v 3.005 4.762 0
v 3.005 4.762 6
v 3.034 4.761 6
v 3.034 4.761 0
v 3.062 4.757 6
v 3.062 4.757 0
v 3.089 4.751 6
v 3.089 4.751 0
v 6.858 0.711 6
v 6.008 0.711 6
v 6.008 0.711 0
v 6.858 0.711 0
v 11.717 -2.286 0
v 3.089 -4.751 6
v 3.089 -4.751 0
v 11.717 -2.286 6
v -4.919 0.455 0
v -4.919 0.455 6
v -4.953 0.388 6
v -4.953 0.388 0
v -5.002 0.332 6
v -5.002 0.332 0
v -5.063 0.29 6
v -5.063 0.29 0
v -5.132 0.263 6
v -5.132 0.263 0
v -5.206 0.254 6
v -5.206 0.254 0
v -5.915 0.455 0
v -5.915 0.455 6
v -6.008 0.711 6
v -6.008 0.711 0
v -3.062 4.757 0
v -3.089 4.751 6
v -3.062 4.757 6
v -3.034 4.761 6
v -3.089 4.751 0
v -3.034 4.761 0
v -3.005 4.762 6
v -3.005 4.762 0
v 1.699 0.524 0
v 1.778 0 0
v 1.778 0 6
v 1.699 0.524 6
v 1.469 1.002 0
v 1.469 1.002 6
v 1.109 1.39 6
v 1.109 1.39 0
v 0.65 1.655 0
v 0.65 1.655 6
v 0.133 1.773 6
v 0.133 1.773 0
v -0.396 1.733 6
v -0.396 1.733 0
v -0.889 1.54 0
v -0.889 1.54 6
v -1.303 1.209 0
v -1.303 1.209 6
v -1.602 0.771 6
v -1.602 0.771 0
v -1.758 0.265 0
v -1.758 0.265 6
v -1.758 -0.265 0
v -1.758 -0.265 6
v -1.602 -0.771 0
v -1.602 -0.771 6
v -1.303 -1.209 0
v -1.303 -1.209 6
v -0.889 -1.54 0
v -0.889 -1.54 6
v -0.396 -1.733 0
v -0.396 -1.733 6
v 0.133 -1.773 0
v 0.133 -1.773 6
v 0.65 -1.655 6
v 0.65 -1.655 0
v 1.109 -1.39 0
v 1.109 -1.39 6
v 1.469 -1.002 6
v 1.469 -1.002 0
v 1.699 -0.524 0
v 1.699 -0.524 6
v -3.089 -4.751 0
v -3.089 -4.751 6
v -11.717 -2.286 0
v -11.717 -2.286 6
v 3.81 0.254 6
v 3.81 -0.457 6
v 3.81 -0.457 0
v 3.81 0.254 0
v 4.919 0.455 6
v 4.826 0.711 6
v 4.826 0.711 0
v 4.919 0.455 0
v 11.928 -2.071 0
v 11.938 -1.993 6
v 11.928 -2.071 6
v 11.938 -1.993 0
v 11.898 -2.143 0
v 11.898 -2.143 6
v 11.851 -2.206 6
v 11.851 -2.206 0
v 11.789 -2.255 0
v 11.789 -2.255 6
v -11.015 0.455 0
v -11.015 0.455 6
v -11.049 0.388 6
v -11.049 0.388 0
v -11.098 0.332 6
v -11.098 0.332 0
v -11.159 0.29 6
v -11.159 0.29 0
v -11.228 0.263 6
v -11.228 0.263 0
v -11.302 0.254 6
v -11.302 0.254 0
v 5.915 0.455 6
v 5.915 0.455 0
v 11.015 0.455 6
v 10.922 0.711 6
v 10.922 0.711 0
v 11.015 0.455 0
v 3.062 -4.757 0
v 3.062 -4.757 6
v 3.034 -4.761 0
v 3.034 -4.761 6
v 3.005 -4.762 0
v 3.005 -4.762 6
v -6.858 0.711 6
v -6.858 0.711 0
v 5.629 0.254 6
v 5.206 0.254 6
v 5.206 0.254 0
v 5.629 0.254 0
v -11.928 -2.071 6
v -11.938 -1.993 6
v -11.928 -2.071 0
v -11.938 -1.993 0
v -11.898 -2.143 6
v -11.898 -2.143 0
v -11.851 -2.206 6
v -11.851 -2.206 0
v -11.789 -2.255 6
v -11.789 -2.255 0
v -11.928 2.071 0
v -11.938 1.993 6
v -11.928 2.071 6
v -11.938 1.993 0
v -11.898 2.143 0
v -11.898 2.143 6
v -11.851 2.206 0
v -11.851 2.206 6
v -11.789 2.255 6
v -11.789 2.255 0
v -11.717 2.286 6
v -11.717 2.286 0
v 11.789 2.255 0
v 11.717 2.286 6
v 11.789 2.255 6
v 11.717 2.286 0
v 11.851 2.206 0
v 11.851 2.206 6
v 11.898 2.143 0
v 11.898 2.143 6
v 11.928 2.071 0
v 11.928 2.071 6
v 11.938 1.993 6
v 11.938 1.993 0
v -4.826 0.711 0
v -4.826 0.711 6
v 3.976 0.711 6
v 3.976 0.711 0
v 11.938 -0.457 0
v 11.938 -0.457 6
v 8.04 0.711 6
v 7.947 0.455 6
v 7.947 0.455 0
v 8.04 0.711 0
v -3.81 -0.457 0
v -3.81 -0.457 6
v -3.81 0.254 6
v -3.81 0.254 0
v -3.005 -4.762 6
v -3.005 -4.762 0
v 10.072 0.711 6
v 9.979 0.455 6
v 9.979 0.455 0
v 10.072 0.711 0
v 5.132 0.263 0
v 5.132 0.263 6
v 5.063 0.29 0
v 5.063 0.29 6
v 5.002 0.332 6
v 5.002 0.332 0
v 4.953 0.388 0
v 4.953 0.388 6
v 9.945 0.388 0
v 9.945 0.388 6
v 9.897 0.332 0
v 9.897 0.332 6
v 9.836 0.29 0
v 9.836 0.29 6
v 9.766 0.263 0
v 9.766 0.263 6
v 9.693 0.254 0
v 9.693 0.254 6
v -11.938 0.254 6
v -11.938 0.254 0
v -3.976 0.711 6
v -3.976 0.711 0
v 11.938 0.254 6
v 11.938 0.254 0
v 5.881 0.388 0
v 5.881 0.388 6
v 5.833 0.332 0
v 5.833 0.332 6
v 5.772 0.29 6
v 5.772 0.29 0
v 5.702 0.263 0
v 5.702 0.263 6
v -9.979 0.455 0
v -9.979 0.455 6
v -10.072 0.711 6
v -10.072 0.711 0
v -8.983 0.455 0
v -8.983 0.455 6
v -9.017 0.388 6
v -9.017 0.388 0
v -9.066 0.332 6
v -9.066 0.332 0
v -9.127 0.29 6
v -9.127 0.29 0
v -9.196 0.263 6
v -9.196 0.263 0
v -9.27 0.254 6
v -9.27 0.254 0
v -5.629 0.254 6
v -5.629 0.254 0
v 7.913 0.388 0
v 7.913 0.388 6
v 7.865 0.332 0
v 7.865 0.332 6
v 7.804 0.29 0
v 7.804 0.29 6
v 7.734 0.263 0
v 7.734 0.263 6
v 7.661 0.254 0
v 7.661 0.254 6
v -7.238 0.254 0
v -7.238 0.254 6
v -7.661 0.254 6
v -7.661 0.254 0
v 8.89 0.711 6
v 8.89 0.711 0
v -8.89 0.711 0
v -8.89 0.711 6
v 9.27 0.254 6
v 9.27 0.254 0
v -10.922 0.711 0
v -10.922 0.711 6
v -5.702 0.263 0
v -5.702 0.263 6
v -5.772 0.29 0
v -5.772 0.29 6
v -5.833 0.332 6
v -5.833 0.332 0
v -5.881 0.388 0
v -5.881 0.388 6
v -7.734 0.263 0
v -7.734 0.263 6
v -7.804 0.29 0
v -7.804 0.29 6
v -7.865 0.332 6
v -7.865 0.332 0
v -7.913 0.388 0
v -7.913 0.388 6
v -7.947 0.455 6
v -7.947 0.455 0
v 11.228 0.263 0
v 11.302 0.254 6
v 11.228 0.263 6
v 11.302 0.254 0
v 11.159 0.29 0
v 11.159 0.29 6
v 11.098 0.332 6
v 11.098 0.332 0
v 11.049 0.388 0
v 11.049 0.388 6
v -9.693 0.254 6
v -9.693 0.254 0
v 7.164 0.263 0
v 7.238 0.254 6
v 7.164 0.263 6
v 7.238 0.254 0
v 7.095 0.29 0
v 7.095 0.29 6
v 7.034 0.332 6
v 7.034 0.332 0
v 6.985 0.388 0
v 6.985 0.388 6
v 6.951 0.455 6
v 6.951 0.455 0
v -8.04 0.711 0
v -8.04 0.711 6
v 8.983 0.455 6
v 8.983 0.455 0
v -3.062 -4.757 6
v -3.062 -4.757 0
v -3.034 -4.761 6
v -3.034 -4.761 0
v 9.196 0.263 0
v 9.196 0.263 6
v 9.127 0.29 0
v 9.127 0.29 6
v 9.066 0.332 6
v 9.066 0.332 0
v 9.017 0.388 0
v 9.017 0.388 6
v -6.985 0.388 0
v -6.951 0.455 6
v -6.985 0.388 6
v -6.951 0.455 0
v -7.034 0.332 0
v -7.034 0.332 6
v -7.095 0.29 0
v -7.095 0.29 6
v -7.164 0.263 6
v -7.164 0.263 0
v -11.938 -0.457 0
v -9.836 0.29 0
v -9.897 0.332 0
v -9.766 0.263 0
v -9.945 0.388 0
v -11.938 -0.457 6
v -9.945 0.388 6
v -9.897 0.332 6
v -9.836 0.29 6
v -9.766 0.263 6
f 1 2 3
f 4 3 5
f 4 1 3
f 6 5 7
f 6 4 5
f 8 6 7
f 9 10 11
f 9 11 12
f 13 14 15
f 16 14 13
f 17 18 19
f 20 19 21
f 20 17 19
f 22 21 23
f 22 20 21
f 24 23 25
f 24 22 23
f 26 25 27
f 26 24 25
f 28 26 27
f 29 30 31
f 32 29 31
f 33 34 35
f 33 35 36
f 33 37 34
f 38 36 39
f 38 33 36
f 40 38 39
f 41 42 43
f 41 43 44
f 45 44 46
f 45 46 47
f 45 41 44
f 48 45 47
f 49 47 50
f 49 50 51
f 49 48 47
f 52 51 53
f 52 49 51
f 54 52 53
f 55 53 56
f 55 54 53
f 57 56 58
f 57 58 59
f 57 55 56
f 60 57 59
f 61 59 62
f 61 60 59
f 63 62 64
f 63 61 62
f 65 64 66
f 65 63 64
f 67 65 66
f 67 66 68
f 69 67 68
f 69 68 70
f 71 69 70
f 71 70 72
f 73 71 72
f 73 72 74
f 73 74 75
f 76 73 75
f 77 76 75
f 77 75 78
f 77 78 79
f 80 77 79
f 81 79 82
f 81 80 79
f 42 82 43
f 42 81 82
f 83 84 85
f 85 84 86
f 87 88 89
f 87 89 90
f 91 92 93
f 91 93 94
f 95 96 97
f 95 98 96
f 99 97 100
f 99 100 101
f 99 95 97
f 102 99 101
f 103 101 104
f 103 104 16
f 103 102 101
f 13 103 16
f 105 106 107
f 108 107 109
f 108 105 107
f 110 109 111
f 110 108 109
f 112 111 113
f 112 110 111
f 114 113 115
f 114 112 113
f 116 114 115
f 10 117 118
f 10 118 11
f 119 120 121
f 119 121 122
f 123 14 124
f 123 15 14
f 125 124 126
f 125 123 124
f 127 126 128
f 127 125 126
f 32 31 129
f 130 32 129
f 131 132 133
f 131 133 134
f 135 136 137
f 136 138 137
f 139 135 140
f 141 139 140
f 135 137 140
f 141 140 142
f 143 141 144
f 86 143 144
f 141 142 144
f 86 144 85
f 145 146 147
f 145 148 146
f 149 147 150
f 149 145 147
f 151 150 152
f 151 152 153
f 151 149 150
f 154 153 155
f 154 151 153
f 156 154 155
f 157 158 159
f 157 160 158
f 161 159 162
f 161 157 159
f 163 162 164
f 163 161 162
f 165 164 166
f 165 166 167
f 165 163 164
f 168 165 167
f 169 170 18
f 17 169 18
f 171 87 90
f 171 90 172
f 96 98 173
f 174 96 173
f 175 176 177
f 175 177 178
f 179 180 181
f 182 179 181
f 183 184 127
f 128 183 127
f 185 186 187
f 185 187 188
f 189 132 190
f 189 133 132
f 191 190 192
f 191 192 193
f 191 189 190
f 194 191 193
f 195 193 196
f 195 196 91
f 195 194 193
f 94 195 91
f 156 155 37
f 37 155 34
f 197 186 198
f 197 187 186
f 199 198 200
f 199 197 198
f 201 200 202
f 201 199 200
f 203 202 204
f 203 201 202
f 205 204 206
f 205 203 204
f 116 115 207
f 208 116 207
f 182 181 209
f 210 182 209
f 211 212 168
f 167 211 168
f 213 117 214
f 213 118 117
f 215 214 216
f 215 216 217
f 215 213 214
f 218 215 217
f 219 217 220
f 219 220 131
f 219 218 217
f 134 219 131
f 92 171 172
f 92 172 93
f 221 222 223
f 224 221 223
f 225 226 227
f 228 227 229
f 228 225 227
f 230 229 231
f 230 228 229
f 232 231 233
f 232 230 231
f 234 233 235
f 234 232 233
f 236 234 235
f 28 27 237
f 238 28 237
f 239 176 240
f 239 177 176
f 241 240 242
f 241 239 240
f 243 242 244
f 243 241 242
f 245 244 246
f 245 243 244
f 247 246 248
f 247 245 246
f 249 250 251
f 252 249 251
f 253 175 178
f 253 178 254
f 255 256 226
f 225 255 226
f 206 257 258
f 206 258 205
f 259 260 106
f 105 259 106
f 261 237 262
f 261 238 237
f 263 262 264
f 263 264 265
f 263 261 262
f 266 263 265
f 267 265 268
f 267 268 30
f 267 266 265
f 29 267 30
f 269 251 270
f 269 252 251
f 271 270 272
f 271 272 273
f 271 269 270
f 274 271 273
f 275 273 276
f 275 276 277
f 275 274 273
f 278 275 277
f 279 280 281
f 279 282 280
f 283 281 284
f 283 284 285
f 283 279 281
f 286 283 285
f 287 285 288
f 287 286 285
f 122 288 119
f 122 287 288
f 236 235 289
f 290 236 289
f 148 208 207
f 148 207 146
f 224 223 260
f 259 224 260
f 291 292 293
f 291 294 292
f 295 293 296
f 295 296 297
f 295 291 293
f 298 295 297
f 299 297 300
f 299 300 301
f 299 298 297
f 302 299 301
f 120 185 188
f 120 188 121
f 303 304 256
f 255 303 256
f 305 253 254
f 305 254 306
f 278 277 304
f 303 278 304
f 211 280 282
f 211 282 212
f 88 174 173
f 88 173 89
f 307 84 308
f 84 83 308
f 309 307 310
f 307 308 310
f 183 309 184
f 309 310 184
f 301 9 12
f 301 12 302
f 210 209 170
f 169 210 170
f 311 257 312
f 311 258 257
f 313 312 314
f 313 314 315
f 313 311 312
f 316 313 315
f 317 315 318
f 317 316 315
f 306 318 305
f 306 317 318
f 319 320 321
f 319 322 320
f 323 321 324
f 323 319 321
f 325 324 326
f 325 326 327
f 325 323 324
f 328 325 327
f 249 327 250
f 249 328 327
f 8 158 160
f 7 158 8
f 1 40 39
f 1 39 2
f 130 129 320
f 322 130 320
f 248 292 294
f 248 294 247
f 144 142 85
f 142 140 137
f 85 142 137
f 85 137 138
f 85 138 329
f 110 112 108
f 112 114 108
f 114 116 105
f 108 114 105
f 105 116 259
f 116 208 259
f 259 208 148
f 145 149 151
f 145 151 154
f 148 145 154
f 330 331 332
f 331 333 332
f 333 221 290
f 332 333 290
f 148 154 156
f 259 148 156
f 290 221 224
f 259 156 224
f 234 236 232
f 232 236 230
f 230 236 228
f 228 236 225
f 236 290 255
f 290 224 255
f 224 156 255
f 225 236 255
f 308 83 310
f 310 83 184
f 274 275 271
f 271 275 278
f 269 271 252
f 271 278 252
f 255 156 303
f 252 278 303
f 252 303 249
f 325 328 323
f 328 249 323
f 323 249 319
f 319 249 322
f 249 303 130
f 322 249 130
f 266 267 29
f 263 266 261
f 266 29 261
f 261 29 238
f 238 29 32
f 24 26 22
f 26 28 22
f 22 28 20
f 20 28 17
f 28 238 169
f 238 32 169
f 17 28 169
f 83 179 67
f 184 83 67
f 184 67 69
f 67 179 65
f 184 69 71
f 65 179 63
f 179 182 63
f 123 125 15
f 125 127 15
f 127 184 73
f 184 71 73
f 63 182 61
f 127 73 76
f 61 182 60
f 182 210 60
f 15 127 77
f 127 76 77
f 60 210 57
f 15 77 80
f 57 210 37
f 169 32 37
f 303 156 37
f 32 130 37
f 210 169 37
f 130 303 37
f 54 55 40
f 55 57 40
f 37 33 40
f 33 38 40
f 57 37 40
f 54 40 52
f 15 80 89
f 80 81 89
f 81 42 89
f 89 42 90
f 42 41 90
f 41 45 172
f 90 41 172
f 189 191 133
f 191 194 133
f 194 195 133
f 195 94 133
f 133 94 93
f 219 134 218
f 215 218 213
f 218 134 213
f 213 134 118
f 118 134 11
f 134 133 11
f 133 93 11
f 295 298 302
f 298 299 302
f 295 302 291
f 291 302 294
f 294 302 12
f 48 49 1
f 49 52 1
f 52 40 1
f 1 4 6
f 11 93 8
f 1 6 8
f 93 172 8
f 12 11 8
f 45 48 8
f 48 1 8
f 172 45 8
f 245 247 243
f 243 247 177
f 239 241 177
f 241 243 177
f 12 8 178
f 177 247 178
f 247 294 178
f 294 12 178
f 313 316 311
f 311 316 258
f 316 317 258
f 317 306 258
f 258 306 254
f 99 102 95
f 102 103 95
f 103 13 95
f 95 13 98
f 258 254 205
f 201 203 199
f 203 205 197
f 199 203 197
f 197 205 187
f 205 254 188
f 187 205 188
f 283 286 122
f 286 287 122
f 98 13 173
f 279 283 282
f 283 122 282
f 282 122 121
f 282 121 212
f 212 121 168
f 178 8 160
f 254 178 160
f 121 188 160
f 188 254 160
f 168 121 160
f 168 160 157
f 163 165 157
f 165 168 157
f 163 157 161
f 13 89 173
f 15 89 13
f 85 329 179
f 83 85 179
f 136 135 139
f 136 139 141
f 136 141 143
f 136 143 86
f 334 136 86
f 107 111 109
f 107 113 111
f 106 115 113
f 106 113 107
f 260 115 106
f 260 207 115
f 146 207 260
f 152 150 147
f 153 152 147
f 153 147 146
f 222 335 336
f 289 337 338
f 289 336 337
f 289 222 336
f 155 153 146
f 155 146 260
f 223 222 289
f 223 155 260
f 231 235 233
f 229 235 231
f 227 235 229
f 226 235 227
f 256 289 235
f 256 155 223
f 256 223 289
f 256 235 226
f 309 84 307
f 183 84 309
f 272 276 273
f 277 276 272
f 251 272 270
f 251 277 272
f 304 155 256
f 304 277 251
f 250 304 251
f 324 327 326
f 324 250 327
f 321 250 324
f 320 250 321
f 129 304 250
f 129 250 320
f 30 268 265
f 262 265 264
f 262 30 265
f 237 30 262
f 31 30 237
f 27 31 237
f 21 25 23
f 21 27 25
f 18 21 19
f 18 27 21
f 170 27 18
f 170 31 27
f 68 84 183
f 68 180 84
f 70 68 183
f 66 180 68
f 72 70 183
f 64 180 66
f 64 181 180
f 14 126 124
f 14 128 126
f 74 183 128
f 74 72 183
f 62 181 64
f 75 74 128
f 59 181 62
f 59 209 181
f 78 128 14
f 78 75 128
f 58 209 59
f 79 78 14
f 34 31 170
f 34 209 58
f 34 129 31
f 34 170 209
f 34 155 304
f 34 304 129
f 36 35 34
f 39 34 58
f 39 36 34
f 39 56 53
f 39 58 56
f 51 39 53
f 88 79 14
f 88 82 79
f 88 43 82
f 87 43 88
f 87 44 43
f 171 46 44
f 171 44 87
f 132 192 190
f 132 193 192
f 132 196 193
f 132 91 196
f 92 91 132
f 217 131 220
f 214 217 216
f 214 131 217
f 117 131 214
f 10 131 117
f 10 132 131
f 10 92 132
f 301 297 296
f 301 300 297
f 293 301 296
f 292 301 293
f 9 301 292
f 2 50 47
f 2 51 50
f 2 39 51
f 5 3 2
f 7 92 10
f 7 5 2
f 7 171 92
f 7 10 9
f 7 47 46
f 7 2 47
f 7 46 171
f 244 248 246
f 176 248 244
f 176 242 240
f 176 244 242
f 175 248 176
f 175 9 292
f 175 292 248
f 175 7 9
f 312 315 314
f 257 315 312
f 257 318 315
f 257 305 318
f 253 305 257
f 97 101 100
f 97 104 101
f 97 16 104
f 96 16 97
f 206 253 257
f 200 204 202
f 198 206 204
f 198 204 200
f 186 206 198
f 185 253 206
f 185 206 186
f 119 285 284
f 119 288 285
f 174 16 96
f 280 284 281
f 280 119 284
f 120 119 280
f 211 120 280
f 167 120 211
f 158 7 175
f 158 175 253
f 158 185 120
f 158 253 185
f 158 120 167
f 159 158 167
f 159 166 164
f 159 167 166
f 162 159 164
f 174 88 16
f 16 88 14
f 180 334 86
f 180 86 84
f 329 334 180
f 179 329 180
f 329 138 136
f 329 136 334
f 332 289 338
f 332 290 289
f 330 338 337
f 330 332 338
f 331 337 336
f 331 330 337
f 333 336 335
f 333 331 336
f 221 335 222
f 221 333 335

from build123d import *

# Parameters (mm, degrees)
SKETCH1_W           = 23.876
SKETCH1_H           = 9.525
SKETCH1_R           = 1.778
BOSS_EXTRUDE1_DEPTH = 6
CUT_EXTRUDE3_DEPTH  = 15.184401653
FILLET1_R           = 0.3048


with BuildPart() as part:
    # Sketch1 → Boss-Extrude1 (new body)
    with BuildSketch(Plane.XY):
        Rectangle(SKETCH1_W, SKETCH1_H)
        Circle(SKETCH1_R, mode=Mode.SUBTRACT)
    extrude(amount=BOSS_EXTRUDE1_DEPTH)

    # Sketch2 → Cut-Extrude3 (cut, through all)
    with BuildSketch(Plane.XY.offset(6)):
        Polygon((-11.938, -0.4572), (-3.81, -0.4572), (-3.81, 0), (-3.81, 0.254), (-3.976407191, 0.7112), (-4.826, 0.7112), (-4.992407191, 0.254), (-5.842, 0.254), (-6.008407191, 0.7112), (-6.858, 0.7112), (-7.024407191, 0.254), (-7.874, 0.254), (-8.040407191, 0.7112), (-8.89, 0.7112), (-9.056407191, 0.254), (-9.906, 0.254), (-10.072407191, 0.7112), (-10.922, 0.7112), (-11.088407191, 0.254), (-11.938, 0.254), align=None)
        Polygon((-11.938, 4.7625), (-11.938, 2.2225), (-3.048, 4.7625), align=None)
        Polygon((-11.938, -2.2225), (-11.938, -4.7625), (-3.048, -4.7625), align=None)
    cut_extrude3 = extrude(amount=-CUT_EXTRUDE3_DEPTH, mode=Mode.SUBTRACT)

    # Mirror1: Cut-Extrude3 across plane
    add(cut_extrude3.mirror(Plane(origin=(0, 0, 0), x_dir=(0, 0, 1), z_dir=(1, 0, 0))), mode=Mode.SUBTRACT)

    # Fillet1
    fillet1_edges = [part.edges().sort_by_distance(p)[0] for p in [
        (4.992407191, 0.254, 3),
        (5.842, 0.254, 3),
        (7.024407191, 0.254, 3),
        (7.874, 0.254, 3),
        (9.056407191, 0.254, 3),
        (9.906, 0.254, 3),
        (11.088407191, 0.254, 3),
        (3.048, 4.7625, 3),
        (11.938, 2.2225, 3),
        (3.048, -4.7625, 3),
        (11.938, -2.2225, 3),
        (-11.088407191, 0.254, 3),
        (-9.906, 0.254, 3),
        (-9.056407191, 0.254, 3),
        (-7.874, 0.254, 3),
        (-7.024407191, 0.254, 3),
        (-5.842, 0.254, 3),
        (-4.992407191, 0.254, 3),
        (-3.048, 4.7625, 3),
        (-11.938, 2.2225, 3),
        (-11.938, -2.2225, 3),
        (-3.048, -4.7625, 3),
    ]]
    fillet(fillet1_edges, radius=FILLET1_R)


solid = part.part
